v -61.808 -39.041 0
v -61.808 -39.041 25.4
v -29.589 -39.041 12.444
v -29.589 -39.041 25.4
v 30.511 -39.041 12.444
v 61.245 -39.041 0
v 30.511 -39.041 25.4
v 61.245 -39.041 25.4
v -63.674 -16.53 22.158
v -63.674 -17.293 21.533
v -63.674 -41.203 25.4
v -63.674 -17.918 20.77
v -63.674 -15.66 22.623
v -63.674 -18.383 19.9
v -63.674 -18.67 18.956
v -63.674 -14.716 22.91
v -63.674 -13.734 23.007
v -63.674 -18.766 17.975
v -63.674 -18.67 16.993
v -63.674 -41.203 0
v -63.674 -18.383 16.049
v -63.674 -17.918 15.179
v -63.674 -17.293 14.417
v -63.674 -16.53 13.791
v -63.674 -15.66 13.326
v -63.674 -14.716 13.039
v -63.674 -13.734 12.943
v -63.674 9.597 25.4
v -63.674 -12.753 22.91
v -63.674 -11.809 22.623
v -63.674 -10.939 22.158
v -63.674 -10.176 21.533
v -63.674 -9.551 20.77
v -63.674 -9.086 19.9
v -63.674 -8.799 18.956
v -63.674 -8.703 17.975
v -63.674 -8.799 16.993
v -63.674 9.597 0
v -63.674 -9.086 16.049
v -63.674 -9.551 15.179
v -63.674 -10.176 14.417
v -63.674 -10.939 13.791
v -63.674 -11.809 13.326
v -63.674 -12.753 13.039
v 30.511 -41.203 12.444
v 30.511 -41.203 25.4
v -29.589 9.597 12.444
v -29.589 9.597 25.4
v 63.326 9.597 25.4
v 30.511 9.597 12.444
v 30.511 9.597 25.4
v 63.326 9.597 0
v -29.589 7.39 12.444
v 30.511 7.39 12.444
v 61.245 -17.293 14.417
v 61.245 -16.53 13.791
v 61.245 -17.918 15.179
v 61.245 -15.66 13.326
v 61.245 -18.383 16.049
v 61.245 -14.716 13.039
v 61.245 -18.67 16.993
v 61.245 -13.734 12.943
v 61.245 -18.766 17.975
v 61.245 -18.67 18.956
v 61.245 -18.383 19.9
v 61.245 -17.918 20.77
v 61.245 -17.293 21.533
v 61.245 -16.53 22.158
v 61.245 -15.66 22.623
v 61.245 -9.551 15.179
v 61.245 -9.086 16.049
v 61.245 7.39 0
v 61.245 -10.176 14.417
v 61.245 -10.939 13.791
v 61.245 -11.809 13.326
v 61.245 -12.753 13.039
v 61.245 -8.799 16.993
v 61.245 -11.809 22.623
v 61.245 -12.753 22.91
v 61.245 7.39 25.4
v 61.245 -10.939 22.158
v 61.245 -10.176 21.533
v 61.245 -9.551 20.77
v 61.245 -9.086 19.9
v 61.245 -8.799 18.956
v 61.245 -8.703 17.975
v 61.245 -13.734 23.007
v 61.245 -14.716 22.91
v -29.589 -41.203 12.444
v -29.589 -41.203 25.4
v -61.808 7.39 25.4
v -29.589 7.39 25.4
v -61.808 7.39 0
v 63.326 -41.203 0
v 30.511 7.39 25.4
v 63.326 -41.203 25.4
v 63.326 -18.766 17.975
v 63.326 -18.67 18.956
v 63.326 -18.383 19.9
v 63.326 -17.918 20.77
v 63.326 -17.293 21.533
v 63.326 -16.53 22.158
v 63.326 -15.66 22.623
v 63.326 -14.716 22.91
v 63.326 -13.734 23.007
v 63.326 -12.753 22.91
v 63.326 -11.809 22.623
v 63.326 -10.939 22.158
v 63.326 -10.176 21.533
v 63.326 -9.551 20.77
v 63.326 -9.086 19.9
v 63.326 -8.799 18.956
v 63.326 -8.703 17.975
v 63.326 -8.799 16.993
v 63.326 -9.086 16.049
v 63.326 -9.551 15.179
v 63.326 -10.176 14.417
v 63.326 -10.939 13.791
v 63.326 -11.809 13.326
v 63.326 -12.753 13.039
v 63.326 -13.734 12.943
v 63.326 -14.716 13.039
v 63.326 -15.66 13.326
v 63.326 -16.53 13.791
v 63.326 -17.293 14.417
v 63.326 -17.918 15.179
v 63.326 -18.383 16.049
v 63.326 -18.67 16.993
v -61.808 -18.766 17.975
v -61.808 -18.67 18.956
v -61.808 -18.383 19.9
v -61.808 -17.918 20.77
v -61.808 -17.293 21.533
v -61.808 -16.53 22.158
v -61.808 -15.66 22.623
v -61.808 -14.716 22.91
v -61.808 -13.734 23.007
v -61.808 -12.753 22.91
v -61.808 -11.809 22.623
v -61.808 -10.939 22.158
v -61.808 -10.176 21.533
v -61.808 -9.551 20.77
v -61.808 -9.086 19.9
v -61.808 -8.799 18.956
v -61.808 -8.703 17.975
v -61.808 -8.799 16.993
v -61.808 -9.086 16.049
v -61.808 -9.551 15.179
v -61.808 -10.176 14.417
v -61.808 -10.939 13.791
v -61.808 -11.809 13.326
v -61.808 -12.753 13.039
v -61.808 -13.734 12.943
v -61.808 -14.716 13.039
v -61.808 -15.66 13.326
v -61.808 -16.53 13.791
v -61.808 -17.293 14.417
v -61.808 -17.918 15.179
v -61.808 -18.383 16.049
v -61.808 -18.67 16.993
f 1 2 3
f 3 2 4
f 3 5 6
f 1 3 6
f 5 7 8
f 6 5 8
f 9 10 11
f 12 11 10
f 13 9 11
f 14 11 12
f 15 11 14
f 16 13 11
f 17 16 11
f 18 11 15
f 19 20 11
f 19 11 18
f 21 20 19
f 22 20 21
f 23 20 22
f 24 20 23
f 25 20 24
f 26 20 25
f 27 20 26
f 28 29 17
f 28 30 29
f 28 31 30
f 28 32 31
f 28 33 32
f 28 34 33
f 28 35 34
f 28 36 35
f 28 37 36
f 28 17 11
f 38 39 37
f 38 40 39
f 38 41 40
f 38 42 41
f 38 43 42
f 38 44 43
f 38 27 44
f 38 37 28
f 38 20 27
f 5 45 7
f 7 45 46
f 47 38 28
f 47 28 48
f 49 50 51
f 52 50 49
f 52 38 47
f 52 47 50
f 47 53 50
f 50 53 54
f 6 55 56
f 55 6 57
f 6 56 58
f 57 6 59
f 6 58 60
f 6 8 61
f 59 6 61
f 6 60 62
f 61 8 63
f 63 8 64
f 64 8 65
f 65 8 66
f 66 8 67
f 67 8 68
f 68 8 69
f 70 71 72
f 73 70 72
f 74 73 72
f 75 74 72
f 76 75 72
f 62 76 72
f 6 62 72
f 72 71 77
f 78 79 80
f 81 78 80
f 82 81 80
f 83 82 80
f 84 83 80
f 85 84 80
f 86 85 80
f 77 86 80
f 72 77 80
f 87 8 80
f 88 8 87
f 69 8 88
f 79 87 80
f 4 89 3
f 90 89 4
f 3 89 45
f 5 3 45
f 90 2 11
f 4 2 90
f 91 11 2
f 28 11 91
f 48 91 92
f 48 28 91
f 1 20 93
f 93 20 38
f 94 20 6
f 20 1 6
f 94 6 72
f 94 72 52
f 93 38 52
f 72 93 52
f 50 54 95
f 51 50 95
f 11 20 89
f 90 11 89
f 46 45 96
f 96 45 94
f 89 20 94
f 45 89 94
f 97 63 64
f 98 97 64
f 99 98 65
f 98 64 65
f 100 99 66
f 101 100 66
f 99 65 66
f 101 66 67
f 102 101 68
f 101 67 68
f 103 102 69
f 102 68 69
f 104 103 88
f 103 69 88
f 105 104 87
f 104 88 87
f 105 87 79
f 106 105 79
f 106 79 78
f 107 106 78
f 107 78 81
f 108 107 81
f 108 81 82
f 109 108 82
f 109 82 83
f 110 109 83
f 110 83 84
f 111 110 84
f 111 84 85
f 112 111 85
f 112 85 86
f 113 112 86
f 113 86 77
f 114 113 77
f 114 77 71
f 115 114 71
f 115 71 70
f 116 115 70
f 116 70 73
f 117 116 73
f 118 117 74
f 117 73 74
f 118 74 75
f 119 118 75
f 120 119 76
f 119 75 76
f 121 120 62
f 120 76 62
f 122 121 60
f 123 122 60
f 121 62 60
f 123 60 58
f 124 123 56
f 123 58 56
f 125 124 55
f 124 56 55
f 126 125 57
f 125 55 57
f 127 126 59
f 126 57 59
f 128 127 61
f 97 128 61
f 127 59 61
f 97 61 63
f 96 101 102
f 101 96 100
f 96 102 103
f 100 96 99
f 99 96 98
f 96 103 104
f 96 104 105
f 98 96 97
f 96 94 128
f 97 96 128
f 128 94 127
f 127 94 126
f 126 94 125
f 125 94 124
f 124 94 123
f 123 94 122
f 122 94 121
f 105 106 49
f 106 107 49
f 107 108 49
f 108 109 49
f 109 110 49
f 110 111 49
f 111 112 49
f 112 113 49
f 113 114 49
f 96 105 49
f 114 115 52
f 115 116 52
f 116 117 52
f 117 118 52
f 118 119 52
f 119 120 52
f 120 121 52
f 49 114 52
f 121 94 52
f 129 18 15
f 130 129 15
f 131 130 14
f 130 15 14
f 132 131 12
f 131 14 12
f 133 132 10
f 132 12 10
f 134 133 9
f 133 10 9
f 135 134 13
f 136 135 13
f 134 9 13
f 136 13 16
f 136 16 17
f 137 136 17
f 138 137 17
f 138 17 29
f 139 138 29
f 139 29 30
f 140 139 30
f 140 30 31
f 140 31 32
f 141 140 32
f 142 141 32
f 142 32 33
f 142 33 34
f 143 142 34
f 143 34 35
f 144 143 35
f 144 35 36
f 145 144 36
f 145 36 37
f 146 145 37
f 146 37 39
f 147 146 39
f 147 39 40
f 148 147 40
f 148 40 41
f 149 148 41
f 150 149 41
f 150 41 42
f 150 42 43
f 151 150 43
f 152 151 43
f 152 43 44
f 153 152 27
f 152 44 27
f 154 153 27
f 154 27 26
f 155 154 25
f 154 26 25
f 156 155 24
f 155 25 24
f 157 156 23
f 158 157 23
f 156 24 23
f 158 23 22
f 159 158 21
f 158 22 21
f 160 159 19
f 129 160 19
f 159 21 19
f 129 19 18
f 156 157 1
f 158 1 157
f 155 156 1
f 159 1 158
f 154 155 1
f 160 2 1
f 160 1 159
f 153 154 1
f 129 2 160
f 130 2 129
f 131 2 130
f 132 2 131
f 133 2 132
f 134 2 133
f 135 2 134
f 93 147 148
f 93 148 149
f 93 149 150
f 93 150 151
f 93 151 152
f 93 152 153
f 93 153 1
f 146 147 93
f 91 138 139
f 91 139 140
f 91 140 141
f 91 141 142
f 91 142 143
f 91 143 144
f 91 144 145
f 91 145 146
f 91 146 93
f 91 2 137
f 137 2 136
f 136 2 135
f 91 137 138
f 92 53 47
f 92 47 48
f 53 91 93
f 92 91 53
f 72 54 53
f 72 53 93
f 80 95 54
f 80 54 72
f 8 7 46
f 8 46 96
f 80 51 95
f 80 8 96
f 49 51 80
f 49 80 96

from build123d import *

# Parameters (mm, degrees)
F0_W     = 127
F0_H     = 50.8
F1_DEPTH = 25.4
F2_W     = 123.053175
F2_H     = 46.431223
F3_DEPTH = 44.45
F4_R     = 5.031907
F5_DEPTH = 156.464
F6_W     = 60.099678
F6_H     = 12.956048
F7_DEPTH = 78.232


with BuildPart() as f1:
    # F0 (on Top) → F1 (new body)
    with BuildSketch(Plane.XY):
        with Locations((-0.174111, -15.803309)):
            Rectangle(F0_W, F0_H)
    extrude(amount=F1_DEPTH)

    # F2 (on face) → F3 (cut)
    with BuildSketch(Plane.XY.offset(25.4)):
        with Locations((-0.281648, -15.825602)):
            Rectangle(F2_W, F2_H)
    extrude(amount=-F3_DEPTH, mode=Mode.SUBTRACT)

    # F4 (on face) → F5 (cut)
    with BuildSketch(Plane(origin=(-63.674111, 0, 0), x_dir=(0, -1, 0), z_dir=(-1, 0, 0))):
        with Locations((13.734436, 17.974596)):
            Circle(F4_R)
    extrude(amount=-F5_DEPTH, mode=Mode.SUBTRACT)

    # F6 (on face) → F7 (cut)
    with BuildSketch(Plane.XZ.offset(41.203309)):
        with Locations((0.460886, 18.921976)):
            Rectangle(F6_W, F6_H)
    extrude(amount=-F7_DEPTH, mode=Mode.SUBTRACT)


solid = f1.part
